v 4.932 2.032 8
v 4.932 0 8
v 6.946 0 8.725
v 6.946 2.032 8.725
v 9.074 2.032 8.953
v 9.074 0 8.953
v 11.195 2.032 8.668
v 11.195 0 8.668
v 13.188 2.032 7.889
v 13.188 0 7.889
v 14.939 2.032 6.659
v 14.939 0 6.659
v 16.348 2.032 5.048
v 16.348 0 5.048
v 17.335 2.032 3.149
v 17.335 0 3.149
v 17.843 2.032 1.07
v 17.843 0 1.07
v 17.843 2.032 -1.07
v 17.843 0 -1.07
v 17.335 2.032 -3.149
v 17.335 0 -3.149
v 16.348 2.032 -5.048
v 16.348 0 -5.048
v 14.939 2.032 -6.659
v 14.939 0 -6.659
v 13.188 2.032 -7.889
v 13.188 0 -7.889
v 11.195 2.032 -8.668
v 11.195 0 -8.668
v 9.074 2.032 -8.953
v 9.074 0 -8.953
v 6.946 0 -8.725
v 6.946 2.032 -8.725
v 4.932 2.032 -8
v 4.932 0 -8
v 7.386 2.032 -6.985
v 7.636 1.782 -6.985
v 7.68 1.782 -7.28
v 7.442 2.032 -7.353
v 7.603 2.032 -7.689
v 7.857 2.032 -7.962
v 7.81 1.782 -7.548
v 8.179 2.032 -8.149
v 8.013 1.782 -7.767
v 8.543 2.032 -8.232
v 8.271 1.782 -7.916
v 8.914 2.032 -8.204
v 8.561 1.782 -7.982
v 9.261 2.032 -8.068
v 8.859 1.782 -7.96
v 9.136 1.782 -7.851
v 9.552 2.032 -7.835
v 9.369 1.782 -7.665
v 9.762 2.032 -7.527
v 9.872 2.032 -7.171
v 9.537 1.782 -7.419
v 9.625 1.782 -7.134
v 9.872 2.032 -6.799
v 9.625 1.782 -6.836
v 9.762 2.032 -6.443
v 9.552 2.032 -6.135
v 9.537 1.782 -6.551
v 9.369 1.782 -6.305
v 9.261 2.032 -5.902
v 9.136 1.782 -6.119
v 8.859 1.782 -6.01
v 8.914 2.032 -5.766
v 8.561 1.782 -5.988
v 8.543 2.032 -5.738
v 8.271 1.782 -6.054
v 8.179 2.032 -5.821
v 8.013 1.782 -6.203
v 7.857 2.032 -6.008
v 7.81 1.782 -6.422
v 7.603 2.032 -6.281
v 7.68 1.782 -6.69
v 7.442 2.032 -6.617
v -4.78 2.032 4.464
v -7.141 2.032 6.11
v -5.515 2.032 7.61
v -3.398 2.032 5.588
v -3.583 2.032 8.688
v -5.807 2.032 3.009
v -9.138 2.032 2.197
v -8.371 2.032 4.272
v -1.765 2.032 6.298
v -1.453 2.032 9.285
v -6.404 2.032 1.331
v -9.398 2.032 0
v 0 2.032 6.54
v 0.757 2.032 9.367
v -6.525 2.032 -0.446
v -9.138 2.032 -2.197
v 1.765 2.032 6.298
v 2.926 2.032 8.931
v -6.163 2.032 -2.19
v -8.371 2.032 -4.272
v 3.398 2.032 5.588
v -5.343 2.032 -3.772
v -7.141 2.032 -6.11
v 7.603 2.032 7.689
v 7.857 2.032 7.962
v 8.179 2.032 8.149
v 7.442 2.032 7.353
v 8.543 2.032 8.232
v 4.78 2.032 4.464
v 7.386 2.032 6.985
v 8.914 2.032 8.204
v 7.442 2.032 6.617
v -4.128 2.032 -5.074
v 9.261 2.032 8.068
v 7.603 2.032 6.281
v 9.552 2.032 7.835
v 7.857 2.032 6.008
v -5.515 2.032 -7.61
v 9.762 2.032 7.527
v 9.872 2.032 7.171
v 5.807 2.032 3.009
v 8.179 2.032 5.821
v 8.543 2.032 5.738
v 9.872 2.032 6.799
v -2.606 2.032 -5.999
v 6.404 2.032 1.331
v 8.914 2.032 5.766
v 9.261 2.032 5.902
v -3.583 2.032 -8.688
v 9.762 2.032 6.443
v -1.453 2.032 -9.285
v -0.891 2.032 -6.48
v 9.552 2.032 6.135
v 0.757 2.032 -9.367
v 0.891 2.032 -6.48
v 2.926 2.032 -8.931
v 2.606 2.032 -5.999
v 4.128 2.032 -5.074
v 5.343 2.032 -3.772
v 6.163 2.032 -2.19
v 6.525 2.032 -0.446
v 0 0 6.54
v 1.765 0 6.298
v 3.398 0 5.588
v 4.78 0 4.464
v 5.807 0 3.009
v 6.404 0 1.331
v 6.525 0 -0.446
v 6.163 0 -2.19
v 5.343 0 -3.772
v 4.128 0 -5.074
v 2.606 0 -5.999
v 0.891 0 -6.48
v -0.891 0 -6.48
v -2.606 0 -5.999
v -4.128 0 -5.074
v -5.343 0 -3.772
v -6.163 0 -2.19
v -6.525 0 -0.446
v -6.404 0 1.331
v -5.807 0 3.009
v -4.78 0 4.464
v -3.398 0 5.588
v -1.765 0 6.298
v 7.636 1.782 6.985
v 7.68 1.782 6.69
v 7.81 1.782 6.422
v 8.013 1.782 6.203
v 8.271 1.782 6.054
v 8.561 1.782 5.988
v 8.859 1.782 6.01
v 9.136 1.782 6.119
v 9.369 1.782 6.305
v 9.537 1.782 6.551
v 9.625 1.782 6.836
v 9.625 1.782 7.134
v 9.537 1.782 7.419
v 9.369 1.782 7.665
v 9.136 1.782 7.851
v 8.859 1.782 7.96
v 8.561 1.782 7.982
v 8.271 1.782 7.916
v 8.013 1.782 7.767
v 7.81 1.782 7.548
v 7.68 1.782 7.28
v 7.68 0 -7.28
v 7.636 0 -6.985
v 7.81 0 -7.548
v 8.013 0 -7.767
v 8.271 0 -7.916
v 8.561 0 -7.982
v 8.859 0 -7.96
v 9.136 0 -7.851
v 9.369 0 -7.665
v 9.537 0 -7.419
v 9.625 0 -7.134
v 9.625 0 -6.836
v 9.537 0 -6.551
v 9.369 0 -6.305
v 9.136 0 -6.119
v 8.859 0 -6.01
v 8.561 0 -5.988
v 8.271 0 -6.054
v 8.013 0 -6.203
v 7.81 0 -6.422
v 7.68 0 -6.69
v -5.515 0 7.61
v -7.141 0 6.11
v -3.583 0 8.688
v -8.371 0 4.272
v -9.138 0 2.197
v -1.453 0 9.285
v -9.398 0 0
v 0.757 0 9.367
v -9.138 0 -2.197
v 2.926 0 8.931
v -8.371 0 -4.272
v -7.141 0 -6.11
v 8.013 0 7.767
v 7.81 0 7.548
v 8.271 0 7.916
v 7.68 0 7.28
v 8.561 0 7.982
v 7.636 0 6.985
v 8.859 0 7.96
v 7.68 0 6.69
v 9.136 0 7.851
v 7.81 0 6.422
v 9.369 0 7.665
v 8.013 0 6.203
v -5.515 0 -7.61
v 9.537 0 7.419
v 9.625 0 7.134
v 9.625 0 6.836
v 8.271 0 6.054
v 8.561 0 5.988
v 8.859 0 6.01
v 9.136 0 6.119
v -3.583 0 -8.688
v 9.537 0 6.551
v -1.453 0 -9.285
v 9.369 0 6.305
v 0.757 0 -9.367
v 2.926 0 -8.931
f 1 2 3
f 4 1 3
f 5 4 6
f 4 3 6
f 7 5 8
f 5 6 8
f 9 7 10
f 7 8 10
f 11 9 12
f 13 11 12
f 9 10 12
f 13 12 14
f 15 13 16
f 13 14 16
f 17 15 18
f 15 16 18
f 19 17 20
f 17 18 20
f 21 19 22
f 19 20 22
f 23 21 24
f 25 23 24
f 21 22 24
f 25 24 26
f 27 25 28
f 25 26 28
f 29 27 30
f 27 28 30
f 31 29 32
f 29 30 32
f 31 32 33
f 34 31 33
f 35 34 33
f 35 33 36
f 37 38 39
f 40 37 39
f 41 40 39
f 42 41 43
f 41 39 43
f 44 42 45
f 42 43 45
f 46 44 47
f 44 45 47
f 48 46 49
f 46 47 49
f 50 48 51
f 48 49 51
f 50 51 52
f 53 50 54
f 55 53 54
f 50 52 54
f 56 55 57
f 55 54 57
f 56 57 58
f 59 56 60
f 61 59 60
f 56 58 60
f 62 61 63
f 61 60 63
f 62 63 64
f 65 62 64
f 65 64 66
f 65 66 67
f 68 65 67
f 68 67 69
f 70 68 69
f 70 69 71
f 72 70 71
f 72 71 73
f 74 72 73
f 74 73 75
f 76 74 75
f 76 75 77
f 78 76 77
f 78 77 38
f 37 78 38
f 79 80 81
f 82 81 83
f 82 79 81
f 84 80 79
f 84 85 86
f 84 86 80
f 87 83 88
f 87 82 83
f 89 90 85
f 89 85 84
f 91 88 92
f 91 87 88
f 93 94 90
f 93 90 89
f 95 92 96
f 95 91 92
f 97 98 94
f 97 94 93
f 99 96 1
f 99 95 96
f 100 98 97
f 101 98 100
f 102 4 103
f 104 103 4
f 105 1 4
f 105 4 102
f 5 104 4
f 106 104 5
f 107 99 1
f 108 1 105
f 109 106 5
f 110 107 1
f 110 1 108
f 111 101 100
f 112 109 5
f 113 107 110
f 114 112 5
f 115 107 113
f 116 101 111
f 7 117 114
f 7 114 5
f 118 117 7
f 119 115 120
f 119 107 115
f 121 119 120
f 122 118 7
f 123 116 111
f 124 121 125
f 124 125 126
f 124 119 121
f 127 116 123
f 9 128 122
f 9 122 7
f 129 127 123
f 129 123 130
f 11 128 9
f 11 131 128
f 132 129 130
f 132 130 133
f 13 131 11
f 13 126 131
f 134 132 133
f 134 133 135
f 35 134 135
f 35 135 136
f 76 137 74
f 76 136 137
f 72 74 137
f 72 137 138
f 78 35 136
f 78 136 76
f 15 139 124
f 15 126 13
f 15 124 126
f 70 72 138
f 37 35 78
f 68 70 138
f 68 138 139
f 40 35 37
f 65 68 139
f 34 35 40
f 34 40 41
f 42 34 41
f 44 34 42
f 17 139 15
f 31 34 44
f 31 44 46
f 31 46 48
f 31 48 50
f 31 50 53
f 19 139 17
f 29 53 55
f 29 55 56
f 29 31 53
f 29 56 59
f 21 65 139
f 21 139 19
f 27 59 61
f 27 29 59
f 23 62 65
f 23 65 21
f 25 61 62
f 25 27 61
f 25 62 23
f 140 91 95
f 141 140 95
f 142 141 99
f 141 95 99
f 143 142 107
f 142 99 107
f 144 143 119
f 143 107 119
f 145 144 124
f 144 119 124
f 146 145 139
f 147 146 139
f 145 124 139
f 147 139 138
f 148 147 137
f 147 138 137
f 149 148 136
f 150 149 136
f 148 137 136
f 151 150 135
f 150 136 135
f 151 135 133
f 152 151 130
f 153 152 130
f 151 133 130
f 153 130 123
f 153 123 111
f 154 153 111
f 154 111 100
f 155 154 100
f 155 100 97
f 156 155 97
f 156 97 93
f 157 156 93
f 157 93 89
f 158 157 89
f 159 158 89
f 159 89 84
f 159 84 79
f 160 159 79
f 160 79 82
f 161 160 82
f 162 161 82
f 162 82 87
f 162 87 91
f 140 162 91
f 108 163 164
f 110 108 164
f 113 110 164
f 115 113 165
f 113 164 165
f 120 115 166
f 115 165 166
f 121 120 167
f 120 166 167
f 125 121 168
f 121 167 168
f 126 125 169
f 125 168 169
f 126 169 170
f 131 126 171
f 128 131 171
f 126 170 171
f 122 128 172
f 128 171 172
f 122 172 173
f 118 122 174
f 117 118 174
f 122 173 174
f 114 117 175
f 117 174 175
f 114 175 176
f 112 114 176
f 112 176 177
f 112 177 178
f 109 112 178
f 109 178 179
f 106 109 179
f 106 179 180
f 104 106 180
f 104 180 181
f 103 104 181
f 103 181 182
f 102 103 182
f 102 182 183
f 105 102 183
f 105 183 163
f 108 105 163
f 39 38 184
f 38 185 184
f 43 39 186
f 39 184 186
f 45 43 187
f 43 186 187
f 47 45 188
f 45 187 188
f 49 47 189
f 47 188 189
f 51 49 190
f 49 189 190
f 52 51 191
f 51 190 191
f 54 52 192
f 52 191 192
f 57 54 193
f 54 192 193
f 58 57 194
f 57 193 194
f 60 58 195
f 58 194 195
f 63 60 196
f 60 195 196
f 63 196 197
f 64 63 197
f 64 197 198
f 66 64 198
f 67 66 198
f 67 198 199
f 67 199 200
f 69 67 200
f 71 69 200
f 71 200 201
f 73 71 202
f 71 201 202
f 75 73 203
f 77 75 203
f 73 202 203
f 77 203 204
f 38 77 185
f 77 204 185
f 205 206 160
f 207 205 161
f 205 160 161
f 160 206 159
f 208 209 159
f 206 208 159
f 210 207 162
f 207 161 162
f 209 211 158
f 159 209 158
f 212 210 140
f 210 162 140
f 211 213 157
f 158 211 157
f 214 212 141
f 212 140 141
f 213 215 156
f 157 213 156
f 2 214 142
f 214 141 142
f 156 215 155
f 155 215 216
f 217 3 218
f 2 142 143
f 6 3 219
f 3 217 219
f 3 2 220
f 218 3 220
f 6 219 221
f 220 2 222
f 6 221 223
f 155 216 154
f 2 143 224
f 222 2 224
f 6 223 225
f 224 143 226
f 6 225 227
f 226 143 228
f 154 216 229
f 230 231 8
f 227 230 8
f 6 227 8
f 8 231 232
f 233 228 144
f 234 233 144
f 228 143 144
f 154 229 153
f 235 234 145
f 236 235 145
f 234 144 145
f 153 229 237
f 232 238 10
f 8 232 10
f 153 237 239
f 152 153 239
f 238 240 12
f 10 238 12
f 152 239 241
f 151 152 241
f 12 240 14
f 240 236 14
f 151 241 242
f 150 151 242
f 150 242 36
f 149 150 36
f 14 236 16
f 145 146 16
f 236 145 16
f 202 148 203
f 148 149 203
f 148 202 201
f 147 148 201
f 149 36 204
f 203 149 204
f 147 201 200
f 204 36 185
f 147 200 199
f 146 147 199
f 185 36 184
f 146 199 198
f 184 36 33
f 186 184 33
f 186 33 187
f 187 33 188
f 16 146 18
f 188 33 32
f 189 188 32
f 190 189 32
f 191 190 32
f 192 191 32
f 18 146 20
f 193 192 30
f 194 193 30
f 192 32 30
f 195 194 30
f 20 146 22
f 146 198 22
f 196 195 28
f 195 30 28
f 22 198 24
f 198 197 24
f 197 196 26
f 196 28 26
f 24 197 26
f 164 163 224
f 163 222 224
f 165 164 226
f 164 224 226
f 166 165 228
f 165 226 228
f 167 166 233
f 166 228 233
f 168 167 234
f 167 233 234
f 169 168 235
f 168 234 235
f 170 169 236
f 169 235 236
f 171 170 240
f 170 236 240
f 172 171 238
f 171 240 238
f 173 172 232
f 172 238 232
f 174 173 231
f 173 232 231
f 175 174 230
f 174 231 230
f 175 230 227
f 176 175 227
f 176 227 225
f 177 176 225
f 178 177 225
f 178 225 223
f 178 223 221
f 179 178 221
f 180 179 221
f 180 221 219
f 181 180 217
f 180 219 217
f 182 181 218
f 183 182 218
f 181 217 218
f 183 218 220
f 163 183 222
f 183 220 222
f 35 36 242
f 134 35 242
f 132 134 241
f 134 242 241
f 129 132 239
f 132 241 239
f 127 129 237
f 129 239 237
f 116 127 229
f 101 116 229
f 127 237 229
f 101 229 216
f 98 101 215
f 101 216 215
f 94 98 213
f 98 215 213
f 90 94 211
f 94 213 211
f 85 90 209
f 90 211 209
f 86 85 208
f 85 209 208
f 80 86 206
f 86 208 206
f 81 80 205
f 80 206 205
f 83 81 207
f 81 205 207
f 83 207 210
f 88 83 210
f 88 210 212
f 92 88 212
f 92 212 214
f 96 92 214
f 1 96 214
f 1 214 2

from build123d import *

# Parameters (mm, degrees)
BOSS_EXTRUDE1_DEPTH                             = 2.032
SKETCH2_R                                       = 6.5405
CUT_EXTRUDE1_DEPTH                              = 21.32515872
CSK_FOR_M2_FLAT_HEAD_MACHINE_SCREW1_D           = 2
CSK_FOR_M2_FLAT_HEAD_MACHINE_SCREW1_CSINK_D     = 2.5
CSK_FOR_M2_FLAT_HEAD_MACHINE_SCREW1_CSINK_ANGLE = 90


with BuildPart() as part:
    # Sketch1 → Boss-Extrude1 (new body)
    with BuildSketch(Plane(origin=(0, 0, 0), x_dir=(1, 0, 0), z_dir=(0, 1, 0))):
        with BuildLine():
            ThreePointArc((4.932283688, 7.999686345), (-9.398, 0), (4.932283688, -7.999686345))
            ThreePointArc((4.932283688, -7.999686345), (17.907, 0), (4.932283688, 7.999686345))
        make_face()
    extrude(amount=BOSS_EXTRUDE1_DEPTH)

    # Sketch2 → Cut-Extrude1 (cut, through all)
    with BuildSketch(Plane(origin=(0, 2.032, 0), x_dir=(1, 0, 0), z_dir=(0, 1, 0))):
        with Locations(Location((0, 0, 0), (0, 0, 270))):
            Circle(SKETCH2_R)
    extrude(amount=-CUT_EXTRUDE1_DEPTH, mode=Mode.SUBTRACT)

    # CSK for M2 Flat Head Machine Screw1 (through all)
    with Locations(Plane(origin=(0, 2.032, 0), x_dir=(1, 0, 0), z_dir=(0, 1, 0))):
        with Locations((8.636, 6.985), (8.636, -6.985)):
            CounterSinkHole(CSK_FOR_M2_FLAT_HEAD_MACHINE_SCREW1_D / 2, CSK_FOR_M2_FLAT_HEAD_MACHINE_SCREW1_CSINK_D / 2, counter_sink_angle=CSK_FOR_M2_FLAT_HEAD_MACHINE_SCREW1_CSINK_ANGLE)


solid = part.part
